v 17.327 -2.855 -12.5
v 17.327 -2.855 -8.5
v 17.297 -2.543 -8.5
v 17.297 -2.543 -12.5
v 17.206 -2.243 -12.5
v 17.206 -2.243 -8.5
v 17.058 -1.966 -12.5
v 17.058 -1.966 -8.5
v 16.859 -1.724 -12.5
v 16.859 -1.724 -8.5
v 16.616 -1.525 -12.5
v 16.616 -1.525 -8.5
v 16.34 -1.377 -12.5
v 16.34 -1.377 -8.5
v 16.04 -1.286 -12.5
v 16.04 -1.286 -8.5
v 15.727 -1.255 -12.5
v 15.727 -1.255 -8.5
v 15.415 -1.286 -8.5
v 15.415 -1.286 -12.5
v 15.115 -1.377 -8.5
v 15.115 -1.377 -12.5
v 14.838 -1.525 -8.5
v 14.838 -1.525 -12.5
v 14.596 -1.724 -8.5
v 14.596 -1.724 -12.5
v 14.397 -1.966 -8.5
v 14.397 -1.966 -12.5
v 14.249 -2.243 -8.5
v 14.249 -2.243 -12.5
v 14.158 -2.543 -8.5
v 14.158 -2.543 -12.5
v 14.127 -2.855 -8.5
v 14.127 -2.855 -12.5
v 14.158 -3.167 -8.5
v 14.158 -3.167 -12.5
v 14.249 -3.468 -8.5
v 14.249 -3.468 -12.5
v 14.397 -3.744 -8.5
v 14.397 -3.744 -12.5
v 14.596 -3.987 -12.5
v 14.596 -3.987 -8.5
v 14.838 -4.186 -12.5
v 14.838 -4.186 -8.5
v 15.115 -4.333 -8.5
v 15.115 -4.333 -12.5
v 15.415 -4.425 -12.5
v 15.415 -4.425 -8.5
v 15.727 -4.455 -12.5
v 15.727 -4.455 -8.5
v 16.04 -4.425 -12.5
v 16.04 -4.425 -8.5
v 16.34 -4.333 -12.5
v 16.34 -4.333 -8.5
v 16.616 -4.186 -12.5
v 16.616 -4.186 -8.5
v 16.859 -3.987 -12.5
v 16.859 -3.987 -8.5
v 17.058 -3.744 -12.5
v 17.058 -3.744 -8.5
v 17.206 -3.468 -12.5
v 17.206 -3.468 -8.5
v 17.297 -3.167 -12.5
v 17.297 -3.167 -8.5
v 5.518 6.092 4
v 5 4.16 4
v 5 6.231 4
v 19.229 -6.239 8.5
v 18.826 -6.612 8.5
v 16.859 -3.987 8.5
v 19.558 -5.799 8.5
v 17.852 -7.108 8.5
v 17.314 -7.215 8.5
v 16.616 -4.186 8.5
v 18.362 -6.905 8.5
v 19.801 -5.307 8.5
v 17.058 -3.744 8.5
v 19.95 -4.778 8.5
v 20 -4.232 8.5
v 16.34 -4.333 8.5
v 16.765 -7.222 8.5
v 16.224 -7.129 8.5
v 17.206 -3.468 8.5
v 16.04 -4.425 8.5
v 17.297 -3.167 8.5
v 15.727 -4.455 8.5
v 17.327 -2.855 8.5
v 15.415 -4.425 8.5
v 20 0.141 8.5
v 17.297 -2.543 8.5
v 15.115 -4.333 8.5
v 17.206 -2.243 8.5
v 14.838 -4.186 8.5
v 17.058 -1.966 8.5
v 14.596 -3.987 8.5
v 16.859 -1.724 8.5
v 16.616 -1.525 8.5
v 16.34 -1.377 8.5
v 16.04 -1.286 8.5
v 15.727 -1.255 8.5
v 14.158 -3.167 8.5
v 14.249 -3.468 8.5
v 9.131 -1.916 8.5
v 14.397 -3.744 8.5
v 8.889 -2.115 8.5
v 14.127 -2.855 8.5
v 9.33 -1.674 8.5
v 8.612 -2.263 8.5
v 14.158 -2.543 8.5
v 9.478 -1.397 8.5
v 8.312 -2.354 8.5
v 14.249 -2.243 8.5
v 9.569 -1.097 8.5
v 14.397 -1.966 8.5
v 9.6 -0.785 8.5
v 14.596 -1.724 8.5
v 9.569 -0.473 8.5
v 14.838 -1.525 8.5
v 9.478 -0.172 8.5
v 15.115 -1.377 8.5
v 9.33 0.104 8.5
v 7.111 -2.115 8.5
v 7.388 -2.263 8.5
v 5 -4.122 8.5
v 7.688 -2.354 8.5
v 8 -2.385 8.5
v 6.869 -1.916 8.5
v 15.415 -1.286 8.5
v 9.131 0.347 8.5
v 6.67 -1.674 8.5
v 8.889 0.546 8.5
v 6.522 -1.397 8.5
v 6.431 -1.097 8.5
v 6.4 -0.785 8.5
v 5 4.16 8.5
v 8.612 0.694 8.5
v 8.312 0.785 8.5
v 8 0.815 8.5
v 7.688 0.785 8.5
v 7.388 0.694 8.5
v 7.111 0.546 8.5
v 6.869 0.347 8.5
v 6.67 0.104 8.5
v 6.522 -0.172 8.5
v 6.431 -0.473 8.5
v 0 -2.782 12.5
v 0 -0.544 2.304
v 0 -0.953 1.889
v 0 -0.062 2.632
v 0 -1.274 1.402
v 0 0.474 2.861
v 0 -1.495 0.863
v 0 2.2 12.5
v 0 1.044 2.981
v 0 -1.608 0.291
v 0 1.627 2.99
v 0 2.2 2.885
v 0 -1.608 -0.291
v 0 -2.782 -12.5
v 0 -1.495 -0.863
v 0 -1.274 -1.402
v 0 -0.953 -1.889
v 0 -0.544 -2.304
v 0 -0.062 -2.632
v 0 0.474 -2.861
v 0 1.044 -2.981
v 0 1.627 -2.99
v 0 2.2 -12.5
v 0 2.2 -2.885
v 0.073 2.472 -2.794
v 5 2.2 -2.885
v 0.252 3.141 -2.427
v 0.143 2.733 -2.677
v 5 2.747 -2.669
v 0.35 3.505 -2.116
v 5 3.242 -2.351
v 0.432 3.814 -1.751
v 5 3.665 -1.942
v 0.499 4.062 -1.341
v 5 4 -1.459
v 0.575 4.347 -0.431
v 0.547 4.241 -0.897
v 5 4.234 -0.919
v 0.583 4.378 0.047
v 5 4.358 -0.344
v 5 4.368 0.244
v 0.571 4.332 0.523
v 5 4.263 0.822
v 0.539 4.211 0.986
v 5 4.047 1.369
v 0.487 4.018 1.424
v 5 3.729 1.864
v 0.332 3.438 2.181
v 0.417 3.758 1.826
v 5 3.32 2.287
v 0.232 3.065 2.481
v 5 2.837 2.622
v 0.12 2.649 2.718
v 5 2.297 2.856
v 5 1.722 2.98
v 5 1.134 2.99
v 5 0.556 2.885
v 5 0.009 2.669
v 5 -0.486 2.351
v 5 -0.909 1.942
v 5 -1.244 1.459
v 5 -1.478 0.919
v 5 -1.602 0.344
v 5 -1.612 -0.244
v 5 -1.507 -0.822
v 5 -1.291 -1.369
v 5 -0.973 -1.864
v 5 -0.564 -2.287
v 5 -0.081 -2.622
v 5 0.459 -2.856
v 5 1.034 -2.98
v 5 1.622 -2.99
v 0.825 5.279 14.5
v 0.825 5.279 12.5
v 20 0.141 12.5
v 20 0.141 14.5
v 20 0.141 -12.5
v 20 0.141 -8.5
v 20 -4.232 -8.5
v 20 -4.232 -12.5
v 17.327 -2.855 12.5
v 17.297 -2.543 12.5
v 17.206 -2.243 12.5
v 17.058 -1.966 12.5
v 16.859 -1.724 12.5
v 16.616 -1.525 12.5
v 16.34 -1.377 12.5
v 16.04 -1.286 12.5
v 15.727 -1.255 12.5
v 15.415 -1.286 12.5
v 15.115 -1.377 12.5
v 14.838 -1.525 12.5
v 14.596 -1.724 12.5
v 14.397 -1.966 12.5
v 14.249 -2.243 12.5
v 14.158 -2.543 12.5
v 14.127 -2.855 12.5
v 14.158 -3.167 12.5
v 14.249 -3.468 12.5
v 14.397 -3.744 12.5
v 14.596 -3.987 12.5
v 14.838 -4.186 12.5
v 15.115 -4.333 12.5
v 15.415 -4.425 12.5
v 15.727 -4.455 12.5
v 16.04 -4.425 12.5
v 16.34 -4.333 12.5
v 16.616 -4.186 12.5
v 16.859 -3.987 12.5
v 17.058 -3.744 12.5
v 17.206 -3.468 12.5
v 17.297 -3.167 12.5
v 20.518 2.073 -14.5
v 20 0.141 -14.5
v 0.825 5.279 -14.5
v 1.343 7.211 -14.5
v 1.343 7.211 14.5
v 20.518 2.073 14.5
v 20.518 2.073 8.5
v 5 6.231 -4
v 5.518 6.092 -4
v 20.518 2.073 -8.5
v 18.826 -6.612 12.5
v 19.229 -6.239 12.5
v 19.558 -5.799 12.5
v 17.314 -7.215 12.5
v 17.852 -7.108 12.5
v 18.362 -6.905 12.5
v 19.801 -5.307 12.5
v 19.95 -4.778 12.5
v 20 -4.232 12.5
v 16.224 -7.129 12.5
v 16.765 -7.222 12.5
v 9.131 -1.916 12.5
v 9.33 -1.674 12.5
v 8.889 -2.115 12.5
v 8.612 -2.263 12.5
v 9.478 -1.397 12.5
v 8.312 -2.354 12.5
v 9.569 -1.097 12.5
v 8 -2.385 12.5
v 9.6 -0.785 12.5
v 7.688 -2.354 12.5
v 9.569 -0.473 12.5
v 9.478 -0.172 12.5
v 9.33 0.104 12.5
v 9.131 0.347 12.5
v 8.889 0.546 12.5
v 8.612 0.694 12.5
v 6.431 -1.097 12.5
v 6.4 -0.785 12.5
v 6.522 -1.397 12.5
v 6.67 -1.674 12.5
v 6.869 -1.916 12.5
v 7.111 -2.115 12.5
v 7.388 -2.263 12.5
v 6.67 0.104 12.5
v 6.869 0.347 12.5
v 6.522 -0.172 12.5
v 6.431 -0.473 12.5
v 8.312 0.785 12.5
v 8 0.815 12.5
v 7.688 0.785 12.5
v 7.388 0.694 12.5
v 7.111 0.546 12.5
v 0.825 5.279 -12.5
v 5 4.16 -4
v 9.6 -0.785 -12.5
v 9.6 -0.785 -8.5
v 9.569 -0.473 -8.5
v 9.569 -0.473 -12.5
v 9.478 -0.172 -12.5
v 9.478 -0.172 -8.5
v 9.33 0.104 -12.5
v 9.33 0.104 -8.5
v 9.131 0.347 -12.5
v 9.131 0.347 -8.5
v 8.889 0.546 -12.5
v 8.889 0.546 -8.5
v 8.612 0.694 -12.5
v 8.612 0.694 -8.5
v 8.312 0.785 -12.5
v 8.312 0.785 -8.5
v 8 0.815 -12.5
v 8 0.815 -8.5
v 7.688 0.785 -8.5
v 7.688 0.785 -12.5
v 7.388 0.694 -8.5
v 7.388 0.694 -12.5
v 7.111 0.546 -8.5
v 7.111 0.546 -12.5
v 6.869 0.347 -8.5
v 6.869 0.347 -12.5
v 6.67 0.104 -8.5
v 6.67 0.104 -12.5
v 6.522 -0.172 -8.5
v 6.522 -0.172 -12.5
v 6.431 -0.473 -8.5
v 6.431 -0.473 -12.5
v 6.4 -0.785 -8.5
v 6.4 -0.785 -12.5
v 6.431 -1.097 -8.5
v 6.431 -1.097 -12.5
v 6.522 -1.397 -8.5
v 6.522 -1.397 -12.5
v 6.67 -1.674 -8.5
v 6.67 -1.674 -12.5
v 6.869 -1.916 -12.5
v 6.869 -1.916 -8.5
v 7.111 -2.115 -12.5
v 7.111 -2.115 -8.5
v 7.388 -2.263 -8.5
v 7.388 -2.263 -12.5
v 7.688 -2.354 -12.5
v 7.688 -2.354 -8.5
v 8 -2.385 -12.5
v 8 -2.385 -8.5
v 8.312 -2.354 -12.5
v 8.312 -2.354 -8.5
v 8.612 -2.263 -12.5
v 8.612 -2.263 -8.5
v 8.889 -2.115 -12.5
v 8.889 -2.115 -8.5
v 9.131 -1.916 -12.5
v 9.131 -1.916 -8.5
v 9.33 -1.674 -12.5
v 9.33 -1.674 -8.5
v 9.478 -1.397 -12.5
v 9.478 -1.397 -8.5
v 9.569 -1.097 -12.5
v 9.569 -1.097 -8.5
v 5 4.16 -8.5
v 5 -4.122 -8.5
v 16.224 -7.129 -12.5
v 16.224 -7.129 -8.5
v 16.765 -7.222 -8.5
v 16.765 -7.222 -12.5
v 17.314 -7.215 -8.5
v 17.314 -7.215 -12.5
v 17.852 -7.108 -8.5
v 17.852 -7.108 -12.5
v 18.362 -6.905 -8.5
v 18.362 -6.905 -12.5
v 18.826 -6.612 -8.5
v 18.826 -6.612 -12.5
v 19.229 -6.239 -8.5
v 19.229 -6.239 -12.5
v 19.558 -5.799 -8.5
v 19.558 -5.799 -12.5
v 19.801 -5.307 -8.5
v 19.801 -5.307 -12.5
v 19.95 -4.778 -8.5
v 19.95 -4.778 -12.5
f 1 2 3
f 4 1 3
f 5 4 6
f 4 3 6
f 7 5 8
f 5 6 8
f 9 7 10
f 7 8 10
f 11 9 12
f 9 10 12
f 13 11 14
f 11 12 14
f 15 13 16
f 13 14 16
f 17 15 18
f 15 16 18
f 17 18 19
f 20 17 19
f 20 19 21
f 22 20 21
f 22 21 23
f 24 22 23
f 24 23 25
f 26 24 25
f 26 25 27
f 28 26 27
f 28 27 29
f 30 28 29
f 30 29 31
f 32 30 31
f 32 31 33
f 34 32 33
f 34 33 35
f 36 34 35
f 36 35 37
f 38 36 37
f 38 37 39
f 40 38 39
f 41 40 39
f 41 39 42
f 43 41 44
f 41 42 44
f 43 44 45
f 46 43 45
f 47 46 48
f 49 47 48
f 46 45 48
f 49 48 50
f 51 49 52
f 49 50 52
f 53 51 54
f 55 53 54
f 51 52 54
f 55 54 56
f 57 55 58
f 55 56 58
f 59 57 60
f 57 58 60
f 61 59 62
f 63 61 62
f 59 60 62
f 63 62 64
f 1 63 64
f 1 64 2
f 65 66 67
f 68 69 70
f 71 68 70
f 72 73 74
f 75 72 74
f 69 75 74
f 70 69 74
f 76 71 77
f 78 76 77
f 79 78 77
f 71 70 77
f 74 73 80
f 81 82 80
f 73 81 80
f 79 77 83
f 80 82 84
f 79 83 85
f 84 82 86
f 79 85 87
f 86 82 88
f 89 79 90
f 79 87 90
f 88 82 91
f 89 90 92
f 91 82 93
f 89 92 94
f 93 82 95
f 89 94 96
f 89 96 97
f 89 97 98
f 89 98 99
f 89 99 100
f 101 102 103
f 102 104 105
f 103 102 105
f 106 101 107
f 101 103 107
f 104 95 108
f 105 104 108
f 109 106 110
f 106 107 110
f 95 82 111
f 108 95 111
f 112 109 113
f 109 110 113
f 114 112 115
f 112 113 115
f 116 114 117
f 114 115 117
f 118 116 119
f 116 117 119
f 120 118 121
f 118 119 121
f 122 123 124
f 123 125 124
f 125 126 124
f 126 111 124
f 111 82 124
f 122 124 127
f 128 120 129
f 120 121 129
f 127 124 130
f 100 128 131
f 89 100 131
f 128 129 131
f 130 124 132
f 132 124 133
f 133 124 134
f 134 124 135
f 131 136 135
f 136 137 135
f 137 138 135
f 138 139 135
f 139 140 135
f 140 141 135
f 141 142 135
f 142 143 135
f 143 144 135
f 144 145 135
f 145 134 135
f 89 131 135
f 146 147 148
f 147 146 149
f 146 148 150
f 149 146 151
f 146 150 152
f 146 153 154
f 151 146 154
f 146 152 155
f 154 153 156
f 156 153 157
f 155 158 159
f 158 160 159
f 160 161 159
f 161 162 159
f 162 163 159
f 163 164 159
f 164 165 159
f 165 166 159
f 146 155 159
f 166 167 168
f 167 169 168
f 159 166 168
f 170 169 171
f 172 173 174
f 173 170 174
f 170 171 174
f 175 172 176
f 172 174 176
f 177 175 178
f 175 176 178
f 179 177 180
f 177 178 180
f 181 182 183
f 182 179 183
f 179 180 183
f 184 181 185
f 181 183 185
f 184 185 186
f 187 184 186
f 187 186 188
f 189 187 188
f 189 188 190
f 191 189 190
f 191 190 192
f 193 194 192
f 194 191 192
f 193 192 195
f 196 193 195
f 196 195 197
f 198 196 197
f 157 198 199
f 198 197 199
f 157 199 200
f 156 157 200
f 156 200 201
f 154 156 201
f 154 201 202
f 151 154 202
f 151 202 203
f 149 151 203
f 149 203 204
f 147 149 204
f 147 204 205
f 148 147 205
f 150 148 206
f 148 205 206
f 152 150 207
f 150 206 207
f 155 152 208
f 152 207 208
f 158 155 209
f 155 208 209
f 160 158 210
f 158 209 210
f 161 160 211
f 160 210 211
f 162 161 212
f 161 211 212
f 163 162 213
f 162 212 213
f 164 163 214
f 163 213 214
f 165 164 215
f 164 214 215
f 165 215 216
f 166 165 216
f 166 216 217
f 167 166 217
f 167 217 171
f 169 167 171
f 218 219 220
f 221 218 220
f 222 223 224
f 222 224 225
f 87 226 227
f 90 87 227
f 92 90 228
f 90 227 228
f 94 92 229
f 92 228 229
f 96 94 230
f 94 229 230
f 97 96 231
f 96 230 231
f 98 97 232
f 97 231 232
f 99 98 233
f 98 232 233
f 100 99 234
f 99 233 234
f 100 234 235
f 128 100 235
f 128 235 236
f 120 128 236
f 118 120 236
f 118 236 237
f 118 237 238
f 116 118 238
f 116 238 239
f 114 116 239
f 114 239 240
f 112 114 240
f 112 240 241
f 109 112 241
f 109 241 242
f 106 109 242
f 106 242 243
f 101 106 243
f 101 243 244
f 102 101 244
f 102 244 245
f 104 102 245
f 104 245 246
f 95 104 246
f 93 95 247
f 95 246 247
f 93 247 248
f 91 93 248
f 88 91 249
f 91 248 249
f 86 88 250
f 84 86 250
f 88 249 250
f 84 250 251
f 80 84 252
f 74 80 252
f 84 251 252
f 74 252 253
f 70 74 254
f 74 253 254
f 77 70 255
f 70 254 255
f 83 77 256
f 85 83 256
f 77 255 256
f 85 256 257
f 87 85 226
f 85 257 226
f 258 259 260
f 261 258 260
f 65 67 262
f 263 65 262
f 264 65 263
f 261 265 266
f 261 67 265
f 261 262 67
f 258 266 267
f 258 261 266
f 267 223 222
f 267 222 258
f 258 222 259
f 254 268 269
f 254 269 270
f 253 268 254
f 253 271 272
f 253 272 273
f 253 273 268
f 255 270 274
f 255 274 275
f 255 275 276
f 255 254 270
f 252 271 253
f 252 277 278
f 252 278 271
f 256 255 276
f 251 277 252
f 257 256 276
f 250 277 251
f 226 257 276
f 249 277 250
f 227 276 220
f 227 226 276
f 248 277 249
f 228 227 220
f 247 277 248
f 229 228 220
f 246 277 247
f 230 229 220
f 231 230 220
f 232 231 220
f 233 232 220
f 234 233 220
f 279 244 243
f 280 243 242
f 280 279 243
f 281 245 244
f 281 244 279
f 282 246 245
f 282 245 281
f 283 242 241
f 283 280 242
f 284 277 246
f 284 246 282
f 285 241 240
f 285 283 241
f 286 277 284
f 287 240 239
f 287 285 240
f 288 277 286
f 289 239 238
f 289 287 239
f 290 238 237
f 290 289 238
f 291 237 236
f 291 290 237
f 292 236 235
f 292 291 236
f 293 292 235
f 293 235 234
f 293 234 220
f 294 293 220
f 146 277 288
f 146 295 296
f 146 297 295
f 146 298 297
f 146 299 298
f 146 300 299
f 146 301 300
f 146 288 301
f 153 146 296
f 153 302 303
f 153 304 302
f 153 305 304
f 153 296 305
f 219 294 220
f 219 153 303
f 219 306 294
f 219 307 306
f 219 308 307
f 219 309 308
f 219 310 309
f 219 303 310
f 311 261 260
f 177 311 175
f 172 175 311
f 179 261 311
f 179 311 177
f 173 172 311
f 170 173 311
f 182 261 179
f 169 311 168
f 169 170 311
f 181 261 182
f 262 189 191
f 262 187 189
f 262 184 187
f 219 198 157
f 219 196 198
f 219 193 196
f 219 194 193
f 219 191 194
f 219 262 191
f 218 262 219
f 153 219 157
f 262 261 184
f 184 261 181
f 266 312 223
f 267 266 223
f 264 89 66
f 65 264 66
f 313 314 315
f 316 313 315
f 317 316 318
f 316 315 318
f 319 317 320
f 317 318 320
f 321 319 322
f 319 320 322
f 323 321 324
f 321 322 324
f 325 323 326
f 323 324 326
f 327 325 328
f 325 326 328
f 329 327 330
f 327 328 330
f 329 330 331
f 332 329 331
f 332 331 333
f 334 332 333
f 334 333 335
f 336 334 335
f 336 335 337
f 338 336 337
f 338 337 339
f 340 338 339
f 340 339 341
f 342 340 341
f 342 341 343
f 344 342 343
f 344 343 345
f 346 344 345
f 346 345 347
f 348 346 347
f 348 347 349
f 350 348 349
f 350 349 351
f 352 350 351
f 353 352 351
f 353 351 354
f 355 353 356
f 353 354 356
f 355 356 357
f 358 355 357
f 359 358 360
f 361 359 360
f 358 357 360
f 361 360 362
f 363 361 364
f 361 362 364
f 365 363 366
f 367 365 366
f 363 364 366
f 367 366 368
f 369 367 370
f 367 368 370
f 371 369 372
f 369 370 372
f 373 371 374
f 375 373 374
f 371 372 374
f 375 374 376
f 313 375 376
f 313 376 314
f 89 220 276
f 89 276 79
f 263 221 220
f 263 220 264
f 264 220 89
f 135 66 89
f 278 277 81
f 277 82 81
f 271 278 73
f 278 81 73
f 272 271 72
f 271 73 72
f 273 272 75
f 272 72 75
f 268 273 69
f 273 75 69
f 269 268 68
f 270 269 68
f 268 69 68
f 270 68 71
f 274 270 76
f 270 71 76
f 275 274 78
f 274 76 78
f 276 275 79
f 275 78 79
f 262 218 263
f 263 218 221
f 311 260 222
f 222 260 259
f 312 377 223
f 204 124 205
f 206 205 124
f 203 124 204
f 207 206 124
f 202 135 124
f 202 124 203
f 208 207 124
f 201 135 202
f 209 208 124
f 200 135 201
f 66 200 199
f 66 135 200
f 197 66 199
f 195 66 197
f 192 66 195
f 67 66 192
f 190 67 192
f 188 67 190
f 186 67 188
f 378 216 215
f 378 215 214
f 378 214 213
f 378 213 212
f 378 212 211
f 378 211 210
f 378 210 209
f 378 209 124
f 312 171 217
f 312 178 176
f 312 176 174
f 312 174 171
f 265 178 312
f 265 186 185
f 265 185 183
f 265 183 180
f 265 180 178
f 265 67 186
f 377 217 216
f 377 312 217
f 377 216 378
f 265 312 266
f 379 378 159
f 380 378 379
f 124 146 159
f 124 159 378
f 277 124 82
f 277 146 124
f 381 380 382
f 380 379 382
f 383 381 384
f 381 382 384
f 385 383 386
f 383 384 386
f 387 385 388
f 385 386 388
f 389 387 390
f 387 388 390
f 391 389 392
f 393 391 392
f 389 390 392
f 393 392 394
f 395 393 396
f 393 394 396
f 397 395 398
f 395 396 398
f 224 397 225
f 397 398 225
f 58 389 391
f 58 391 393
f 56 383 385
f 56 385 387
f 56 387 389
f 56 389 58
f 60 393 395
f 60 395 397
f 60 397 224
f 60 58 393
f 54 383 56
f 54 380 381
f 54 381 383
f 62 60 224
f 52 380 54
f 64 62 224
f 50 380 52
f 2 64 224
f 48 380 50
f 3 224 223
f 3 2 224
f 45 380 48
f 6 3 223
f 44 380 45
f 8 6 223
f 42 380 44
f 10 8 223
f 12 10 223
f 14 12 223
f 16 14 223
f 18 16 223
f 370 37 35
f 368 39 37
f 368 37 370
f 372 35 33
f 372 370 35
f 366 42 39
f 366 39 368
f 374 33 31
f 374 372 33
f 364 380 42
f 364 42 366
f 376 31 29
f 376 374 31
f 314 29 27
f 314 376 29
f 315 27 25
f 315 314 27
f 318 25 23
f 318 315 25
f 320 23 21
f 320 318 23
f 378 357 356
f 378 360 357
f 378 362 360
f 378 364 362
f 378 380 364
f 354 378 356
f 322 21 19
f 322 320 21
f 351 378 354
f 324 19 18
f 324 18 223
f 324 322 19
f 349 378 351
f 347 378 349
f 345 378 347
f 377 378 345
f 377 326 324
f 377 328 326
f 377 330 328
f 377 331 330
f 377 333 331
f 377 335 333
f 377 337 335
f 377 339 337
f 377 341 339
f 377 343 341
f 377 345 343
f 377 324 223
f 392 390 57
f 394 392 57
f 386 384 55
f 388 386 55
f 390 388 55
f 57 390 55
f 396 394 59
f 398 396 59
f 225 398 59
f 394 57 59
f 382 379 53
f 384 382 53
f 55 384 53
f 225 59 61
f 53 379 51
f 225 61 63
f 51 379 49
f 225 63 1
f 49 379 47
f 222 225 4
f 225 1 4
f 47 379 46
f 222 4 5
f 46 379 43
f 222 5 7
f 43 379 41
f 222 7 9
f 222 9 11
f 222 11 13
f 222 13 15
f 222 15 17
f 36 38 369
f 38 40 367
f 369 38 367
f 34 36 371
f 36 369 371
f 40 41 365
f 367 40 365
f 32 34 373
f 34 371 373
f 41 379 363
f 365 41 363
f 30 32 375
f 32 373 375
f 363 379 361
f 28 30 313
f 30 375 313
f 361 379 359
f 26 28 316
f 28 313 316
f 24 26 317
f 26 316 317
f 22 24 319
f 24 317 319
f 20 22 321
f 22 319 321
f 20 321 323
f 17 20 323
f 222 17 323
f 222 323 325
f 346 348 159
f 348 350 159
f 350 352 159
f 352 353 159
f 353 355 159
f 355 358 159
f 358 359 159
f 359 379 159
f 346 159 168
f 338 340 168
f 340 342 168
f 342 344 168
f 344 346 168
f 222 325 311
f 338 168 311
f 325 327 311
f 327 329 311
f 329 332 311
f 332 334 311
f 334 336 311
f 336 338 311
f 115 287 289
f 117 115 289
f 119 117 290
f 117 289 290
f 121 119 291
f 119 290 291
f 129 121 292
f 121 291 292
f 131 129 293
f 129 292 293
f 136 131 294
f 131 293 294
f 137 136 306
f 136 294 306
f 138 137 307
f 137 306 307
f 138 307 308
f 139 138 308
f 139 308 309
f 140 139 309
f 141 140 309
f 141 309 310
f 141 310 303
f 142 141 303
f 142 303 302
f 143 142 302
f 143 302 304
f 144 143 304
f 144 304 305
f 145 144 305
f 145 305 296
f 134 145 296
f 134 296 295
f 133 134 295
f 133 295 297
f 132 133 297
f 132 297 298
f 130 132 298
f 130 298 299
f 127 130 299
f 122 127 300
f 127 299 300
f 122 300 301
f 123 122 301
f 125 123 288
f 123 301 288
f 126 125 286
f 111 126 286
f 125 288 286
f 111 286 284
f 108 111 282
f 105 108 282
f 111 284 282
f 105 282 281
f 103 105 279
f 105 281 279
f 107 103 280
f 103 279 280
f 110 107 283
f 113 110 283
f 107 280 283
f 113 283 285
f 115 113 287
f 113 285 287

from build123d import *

# Parameters (mm, degrees)
SKETCH_1_W          = 25
SKETCH_1_H          = 11
EXTRUDE_1_DEPTH     = 5
SKETCH_2_W          = 4
SKETCH_2_H          = 15
EXTRUDE_2_DEPTH     = 15
SKETCH_4_R          = 1.6
CUT_EXTRUDE_1_DEPTH = 34.395358959
EXTRUDE_3_DEPTH     = 2
CUT_EXTRUDE_2_DEPTH = 37.4451986
SKETCH_8_R          = 3
CUT_EXTRUDE_3_DEPTH = 23.744804244
SKETCH_9_W          = 8
SKETCH_9_H          = 6.263890715
CUT_EXTRUDE_4_DEPTH = 23.744804244
FILLET_1_R          = 3


with BuildPart() as part:
    # 草图1 → 凸台-拉伸1 (new body)
    with BuildSketch(Plane(origin=(0, 0, 0), x_dir=(0, 0, -1), z_dir=(1, 0, 0))):
        Rectangle(SKETCH_1_W, SKETCH_1_H)
    extrude(amount=EXTRUDE_1_DEPTH)

    # 草图2 → 凸台-拉伸2 (add)
    with BuildSketch(Plane(origin=(5, 0, 0), x_dir=(0, 0, -1), z_dir=(1, 0, 0))):
        with Locations((-10.5, -2)):
            Rectangle(SKETCH_2_W, SKETCH_2_H)
        with Locations((10.5, -2)):
            Rectangle(SKETCH_2_W, SKETCH_2_H)
    extrude(amount=EXTRUDE_2_DEPTH)

    # 草图4 → 切除-拉伸1 (cut, through all)
    with BuildSketch(Plane.XY.offset(12.5)):
        with Locations((15.72740661, -2.855250622)):
            Circle(SKETCH_4_R)
        with Locations((8, -0.784698261)):
            Circle(SKETCH_4_R)
        Polygon((0, 5.5), (20, 0.141016151), (20, 5.5), align=None)
        Polygon((0, -2.782209443), (20, -8.141193292), (20, -9.5), (0, -9.5), align=None)
    extrude(amount=-CUT_EXTRUDE_1_DEPTH, mode=Mode.SUBTRACT)

    # 草图6 → 凸台-拉伸3 (add)
    with BuildSketch(Plane(origin=(1.375, 5.13156986, 0), x_dir=(0.96592582628907, -0.25881904510251436, 0), z_dir=(0.25881904510251436, 0.96592582628907, 0))):
        Polygon((19.28201886, 8.5), (19.28201886, 14.5), (-1.423504748, 14.5), (-1.423504748, -14.5), (19.28201886, -14.5), (19.28201886, -8.5), (3.752876154, -4), (3.752876154, 4), align=None)
    extrude(amount=EXTRUDE_3_DEPTH)

    # 草图7 → 切除-拉伸2 (cut, through all)
    with BuildSketch(Plane.XY.offset(14.5)):
        Polygon((1.342544747, 7.21081858), (0, 2.200373372), (-7.179719812, 0.653741147), (-4.482102144, 8.771528011), align=None)
    extrude(amount=-CUT_EXTRUDE_2_DEPTH, mode=Mode.SUBTRACT)

    # 草图8 → 切除-拉伸3 (cut, through all)
    with BuildSketch(Plane(origin=(5, 0, 0), x_dir=(0, 0, -1), z_dir=(1, 0, 0))):
        with Locations(Location((0, 1.378044595, 0), (0, 0, 15.908958728))):
            Circle(SKETCH_8_R)
    extrude(amount=-CUT_EXTRUDE_3_DEPTH, mode=Mode.SUBTRACT)

    # 草图9 → 切除-拉伸4 (cut, through all)
    with BuildSketch(Plane(origin=(5, 0, 0), x_dir=(0, 0, -1), z_dir=(1, 0, 0))):
        with Locations((0, 3.617975326)):
            Rectangle(SKETCH_9_W, SKETCH_9_H)
    extrude(amount=CUT_EXTRUDE_4_DEPTH, mode=Mode.SUBTRACT)

    # 圆角1
    fillet_1_edges = [part.edges().sort_by_distance(p)[0] for p in [
        (20, -8.141193292, 10.5),
        (20, -8.141193292, -10.5),
    ]]
    fillet(fillet_1_edges, radius=FILLET_1_R)


solid = part.part
